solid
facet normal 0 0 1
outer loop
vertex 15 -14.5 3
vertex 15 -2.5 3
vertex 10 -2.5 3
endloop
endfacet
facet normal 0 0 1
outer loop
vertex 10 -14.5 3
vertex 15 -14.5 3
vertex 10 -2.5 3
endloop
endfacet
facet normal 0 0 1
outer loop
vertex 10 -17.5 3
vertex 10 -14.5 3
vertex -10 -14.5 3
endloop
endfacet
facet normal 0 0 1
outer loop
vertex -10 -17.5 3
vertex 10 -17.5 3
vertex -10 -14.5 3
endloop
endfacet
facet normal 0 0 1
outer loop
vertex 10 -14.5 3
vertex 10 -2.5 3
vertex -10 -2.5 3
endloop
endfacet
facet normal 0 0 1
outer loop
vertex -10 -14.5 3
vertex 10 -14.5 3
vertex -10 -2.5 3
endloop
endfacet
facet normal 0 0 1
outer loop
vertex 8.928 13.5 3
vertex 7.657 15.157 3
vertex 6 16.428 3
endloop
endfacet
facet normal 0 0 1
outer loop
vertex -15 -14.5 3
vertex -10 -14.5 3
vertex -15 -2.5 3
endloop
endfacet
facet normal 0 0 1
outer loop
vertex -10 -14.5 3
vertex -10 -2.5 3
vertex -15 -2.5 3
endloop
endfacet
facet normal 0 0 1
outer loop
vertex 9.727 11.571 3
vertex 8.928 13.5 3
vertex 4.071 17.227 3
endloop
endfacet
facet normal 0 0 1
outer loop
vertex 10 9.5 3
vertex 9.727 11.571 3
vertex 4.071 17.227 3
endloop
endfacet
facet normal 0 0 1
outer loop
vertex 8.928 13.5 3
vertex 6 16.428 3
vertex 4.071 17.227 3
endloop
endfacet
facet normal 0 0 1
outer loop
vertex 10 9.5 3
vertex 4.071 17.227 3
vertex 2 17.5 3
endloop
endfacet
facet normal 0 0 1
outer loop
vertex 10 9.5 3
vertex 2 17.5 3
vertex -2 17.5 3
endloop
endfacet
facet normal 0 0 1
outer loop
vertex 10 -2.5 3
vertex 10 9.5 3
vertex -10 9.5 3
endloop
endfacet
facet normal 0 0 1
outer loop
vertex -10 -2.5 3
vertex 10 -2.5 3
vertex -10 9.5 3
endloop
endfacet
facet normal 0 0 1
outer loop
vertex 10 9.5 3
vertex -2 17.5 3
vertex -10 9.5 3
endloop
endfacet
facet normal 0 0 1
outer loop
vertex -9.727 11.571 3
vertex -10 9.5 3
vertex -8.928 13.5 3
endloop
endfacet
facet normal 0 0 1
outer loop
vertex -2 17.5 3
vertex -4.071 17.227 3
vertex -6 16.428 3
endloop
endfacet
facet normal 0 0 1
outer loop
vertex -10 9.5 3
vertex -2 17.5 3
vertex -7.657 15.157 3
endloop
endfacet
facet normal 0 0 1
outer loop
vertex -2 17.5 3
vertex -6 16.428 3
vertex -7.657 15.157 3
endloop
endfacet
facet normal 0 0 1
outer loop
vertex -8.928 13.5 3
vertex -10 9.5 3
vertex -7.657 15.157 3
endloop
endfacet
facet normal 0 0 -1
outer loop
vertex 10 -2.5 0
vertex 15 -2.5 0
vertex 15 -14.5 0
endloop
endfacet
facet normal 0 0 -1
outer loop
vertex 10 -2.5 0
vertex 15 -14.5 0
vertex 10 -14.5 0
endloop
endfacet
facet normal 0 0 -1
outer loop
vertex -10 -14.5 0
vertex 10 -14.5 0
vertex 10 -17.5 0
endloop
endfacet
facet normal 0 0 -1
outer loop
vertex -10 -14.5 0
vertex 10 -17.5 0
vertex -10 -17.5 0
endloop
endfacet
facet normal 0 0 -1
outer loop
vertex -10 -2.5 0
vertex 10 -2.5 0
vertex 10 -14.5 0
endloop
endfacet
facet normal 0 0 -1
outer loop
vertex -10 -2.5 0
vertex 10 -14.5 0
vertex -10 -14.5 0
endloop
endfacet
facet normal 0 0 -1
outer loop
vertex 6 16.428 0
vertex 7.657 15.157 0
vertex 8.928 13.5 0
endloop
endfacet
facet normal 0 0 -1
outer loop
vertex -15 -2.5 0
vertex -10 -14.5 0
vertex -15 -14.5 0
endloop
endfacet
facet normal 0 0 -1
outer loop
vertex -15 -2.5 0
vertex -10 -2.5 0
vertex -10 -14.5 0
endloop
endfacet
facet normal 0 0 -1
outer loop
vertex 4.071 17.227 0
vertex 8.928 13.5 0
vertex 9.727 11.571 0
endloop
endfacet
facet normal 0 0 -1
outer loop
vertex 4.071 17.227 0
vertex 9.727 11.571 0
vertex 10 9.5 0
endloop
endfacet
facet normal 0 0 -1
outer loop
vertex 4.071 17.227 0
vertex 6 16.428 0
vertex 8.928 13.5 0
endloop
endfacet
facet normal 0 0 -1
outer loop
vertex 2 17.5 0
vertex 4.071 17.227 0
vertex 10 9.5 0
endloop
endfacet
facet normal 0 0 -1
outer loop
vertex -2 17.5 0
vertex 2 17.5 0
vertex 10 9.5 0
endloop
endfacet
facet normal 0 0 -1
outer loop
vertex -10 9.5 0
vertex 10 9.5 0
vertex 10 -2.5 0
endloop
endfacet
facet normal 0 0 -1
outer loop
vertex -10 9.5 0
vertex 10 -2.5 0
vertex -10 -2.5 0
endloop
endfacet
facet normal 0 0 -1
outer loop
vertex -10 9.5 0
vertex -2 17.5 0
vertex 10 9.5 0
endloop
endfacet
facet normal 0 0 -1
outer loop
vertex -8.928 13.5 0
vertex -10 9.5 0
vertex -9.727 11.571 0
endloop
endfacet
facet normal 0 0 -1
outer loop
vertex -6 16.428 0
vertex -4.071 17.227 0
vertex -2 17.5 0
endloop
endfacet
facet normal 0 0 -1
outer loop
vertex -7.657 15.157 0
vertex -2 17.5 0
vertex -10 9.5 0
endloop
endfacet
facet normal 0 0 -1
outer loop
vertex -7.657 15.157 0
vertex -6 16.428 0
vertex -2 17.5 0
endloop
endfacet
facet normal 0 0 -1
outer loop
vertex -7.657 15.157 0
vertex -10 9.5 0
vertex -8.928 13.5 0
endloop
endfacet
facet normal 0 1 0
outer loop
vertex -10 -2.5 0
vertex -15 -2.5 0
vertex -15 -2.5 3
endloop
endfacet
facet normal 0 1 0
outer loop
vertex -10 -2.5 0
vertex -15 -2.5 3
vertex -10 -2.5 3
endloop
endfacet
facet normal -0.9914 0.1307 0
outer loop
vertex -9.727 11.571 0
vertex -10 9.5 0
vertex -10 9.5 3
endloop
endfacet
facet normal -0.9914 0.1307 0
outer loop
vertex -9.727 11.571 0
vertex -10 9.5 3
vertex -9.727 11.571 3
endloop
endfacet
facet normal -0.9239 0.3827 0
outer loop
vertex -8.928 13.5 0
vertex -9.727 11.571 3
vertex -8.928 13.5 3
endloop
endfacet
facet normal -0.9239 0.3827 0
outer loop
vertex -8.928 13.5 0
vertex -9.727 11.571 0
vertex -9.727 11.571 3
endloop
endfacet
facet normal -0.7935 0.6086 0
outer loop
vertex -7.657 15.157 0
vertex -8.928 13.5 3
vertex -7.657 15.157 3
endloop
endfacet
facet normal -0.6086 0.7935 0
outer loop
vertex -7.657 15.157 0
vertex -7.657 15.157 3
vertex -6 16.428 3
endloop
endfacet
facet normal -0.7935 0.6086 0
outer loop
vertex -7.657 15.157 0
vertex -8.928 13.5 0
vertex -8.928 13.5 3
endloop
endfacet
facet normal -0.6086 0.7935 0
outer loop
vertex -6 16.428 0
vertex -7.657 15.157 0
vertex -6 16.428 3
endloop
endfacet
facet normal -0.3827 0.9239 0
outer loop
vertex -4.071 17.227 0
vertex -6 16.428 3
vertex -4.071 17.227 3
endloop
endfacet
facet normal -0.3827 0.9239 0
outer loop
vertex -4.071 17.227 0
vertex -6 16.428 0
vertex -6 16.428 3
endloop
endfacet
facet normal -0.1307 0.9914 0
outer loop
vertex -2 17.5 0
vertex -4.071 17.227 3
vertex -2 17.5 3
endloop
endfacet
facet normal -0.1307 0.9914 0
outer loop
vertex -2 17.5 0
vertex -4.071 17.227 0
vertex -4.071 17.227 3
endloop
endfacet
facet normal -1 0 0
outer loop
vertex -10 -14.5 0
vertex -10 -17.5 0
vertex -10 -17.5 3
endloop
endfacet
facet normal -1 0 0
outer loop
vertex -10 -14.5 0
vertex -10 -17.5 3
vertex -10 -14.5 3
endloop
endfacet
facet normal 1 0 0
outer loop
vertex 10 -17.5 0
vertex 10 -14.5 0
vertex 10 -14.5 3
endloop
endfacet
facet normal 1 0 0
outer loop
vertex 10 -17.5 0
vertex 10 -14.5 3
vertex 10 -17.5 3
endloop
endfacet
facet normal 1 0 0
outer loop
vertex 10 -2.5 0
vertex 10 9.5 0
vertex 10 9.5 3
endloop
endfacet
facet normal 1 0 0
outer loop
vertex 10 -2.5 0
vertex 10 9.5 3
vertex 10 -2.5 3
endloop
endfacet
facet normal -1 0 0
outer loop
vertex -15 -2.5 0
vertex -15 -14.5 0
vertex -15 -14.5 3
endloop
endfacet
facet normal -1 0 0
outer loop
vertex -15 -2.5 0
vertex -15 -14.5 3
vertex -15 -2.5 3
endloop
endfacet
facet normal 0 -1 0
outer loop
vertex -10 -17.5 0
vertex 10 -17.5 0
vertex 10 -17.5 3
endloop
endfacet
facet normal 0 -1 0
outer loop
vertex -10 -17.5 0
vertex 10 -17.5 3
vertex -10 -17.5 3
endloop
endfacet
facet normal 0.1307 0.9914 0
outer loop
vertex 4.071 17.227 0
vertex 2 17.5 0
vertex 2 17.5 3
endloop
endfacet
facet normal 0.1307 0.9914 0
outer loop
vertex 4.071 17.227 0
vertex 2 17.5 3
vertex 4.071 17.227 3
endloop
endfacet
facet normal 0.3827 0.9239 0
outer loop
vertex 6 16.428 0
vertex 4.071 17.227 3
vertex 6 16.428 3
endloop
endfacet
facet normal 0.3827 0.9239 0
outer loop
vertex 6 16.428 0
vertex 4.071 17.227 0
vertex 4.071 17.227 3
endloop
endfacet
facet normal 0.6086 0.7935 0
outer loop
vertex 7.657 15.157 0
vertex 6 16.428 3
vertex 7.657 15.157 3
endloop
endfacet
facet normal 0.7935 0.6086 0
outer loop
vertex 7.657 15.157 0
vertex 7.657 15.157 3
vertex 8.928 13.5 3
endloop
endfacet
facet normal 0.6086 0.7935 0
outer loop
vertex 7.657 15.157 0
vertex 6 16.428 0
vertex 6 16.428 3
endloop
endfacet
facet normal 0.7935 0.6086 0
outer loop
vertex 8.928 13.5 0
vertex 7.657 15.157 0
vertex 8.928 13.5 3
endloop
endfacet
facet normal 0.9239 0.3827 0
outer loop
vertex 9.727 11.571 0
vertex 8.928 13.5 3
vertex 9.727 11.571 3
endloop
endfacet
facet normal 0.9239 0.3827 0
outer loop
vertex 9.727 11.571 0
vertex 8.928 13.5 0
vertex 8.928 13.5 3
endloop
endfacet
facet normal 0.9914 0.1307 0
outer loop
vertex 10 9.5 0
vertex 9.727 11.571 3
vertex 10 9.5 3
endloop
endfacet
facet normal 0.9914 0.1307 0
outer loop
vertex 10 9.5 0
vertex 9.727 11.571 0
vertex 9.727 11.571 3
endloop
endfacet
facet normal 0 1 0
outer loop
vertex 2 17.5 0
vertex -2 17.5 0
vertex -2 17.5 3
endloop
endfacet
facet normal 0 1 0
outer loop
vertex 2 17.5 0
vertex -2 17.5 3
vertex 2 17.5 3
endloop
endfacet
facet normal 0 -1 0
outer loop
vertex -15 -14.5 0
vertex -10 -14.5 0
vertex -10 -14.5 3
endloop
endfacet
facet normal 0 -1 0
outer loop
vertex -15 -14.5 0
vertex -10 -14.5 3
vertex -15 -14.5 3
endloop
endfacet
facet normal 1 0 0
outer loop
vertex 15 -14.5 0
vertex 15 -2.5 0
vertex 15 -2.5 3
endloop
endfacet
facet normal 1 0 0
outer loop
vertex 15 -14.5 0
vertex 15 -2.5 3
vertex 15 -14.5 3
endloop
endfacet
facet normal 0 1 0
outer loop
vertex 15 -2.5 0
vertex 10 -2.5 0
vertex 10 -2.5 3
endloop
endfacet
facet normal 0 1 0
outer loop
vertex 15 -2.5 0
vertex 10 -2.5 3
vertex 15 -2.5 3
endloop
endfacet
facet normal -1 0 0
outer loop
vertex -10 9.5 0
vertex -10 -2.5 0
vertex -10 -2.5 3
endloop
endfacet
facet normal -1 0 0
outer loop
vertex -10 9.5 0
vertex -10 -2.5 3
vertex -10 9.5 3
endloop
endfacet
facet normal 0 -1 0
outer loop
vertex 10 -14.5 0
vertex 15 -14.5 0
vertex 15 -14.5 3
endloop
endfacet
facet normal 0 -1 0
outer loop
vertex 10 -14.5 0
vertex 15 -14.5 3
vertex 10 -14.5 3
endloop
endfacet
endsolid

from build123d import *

# Parameters (mm, degrees)
SALIENTE_EXTRUIR1_DEPTH = 3


with BuildPart() as part:
    # Croquis1 → Saliente-Extruir1 (new body)
    with BuildSketch(Plane.XY):
        with BuildLine():
            Line((-10, -2.5), (-10, 9.5))
            ThreePointArc((-10, 9.5), (-7.656854249, 15.156854249), (-2, 17.5))
            Line((-2, 17.5), (2, 17.5))
            ThreePointArc((2, 17.5), (7.656854249, 15.156854249), (10, 9.5))
            Line((10, 9.5), (10, -2.5))
            Line((10, -2.5), (15, -2.5))
            Line((15, -2.5), (15, -14.5))
            Line((15, -14.5), (10, -14.5))
            Line((10, -14.5), (10, -17.5))
            Line((10, -17.5), (-10, -17.5))
            Line((-10, -17.5), (-10, -14.5))
            Line((-10, -14.5), (-15, -14.5))
            Line((-15, -14.5), (-15, -2.5))
            Line((-15, -2.5), (-10, -2.5))
        make_face()
    extrude(amount=SALIENTE_EXTRUIR1_DEPTH)


solid = part.part
